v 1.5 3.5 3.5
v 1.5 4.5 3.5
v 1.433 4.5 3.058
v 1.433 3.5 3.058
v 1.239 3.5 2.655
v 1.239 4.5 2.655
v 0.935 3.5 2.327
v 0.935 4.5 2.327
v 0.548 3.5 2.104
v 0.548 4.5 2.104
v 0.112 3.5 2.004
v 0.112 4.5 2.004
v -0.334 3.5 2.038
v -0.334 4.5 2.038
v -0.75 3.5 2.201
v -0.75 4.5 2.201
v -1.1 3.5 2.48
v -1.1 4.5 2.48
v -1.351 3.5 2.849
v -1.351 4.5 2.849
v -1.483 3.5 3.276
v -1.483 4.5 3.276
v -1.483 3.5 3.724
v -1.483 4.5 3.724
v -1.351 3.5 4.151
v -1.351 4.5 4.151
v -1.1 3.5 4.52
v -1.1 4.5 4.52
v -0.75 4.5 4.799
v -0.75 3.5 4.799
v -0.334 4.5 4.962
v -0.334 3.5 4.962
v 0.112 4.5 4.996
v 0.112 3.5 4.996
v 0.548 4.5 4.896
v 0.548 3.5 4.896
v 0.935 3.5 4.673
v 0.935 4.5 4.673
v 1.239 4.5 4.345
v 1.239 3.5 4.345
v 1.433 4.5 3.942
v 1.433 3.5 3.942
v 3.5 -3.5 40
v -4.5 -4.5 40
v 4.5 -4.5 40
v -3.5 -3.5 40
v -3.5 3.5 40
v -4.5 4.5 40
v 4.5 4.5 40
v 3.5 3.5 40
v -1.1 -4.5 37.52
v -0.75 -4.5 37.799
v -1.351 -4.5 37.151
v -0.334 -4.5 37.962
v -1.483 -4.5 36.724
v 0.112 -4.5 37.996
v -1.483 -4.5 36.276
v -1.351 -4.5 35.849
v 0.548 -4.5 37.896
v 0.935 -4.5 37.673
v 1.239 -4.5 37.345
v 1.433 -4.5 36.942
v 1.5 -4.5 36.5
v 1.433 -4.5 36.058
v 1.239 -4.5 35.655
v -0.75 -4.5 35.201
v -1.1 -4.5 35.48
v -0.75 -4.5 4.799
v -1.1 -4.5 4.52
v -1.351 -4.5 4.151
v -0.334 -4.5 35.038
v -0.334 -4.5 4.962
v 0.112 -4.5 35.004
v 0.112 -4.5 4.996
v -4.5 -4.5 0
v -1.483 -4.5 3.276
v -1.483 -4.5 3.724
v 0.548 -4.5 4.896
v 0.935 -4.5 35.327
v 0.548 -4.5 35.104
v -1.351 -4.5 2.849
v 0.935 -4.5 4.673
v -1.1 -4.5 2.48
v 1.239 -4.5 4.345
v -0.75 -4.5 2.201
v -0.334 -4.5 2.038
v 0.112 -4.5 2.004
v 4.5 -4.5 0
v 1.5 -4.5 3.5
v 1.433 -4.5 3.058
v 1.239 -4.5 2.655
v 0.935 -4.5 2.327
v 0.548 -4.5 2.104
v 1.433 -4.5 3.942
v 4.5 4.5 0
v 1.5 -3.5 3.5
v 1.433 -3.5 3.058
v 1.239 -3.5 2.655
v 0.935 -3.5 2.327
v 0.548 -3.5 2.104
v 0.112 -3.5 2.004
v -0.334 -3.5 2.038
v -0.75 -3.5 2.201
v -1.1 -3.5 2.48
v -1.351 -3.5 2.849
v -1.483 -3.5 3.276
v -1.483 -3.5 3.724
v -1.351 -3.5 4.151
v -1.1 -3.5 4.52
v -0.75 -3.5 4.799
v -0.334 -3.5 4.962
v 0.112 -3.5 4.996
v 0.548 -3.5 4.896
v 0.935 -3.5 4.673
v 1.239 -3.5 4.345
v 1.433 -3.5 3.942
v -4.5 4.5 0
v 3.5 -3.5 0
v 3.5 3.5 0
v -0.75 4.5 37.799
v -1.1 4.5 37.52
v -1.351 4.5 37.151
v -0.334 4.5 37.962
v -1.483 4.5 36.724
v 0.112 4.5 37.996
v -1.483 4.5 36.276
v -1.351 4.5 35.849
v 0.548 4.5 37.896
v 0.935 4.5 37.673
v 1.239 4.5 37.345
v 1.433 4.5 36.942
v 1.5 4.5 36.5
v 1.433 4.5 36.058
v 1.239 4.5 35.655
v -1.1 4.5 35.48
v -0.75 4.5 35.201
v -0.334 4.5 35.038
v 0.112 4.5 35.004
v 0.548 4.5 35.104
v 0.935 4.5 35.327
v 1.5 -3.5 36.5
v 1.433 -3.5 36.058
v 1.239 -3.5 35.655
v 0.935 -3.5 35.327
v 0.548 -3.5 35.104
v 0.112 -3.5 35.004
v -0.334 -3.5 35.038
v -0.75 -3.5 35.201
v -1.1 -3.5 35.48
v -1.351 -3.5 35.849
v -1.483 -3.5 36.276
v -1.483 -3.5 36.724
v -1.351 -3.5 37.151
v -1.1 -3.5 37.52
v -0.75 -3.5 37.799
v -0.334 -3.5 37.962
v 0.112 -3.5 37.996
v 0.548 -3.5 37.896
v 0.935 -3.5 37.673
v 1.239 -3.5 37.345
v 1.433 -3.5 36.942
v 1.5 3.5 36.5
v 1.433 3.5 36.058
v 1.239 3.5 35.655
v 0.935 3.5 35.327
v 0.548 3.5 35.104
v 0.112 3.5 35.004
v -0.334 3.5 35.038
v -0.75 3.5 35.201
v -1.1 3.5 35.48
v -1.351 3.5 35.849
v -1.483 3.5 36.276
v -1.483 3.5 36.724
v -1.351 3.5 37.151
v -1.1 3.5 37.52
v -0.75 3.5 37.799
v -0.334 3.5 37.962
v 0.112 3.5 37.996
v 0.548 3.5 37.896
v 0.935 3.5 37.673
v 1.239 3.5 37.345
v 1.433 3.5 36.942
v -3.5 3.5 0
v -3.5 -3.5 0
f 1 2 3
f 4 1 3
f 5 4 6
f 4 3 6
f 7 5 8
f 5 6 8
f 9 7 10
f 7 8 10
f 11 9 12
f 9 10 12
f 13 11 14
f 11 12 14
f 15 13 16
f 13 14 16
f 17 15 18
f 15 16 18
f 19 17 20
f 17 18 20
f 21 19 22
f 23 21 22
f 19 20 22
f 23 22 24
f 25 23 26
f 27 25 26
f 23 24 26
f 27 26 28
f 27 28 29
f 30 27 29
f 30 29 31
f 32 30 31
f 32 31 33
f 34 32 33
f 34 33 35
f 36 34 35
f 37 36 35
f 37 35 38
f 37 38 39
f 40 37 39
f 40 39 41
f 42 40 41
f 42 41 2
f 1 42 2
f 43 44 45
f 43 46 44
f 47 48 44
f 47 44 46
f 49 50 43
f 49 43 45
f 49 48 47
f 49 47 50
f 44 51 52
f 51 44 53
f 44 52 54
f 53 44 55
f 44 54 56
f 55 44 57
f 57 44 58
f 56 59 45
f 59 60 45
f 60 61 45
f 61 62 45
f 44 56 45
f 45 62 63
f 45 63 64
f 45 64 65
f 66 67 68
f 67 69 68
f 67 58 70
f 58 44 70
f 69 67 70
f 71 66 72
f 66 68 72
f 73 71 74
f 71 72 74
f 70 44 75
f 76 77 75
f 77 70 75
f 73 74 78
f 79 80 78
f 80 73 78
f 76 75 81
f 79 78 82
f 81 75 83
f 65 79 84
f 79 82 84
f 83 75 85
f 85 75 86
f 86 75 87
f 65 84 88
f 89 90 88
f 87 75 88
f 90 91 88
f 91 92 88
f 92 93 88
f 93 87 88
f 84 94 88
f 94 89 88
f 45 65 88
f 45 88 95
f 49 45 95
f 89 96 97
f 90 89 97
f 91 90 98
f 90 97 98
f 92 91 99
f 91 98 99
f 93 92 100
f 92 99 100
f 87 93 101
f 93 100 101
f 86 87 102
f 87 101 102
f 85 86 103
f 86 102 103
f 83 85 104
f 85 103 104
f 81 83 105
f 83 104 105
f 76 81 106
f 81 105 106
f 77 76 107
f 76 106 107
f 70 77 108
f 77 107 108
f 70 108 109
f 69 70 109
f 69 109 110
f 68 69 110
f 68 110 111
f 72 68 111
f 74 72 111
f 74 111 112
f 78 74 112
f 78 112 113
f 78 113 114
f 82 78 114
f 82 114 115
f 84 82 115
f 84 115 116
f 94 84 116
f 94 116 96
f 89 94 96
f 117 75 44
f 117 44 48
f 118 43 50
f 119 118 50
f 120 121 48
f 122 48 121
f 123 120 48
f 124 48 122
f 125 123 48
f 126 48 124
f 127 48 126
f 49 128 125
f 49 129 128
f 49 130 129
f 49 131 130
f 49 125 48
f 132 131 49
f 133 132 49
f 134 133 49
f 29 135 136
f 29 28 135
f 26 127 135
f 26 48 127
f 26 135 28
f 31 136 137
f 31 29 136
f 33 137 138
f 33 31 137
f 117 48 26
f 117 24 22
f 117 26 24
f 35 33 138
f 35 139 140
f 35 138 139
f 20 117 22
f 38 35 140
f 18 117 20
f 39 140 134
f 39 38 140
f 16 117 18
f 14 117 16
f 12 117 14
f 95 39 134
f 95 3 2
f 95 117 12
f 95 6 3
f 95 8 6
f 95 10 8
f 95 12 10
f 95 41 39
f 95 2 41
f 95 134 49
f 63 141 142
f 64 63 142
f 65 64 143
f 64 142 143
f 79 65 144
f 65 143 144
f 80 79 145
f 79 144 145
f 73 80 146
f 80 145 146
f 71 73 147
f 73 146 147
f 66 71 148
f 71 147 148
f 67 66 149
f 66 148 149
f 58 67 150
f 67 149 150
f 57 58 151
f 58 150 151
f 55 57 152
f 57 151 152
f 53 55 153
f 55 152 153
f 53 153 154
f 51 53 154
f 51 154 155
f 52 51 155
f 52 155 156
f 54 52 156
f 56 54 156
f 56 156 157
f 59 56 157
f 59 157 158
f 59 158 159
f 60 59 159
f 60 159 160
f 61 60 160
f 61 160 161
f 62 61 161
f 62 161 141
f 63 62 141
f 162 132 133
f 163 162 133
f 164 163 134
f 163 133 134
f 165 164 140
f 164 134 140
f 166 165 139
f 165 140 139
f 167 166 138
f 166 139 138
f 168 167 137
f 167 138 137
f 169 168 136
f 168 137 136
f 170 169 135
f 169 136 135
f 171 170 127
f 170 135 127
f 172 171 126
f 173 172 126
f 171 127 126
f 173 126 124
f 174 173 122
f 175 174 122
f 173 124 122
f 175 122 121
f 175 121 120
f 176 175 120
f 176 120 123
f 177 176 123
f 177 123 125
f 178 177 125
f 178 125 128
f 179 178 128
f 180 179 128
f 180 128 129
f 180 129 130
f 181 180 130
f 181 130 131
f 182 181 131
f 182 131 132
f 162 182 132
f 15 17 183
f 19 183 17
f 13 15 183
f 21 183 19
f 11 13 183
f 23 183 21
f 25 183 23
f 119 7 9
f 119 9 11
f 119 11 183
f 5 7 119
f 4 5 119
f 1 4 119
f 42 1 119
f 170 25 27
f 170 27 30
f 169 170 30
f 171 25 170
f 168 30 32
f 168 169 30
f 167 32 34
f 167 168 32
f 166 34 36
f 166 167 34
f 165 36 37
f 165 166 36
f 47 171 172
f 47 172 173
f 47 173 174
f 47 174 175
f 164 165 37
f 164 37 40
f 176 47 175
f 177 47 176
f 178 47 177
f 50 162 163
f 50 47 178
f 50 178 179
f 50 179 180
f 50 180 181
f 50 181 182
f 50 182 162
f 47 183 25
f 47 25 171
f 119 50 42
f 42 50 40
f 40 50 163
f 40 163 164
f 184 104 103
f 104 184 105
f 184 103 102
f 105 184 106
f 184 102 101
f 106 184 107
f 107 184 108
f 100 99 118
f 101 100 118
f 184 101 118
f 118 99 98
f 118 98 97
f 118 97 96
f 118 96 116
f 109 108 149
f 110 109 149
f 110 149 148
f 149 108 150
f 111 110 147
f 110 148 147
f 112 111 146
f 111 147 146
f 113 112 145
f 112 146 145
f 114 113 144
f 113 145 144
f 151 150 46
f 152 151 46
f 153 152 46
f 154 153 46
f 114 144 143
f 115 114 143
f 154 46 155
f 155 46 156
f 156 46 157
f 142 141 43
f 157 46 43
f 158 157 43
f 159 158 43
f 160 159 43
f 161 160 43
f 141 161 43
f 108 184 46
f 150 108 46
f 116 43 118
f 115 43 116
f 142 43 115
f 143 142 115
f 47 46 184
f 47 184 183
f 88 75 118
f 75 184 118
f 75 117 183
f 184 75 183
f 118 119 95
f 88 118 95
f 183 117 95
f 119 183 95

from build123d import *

# Parameters (mm, degrees)
SKETCH_1_W          = 9
SKETCH_1_H          = 9
EXTRUDE_1_DEPTH     = 40
SKETCH_2_W          = 7
SKETCH_2_H          = 7
CUT_EXTRUDE_1_DEPTH = 40
SKETCH_3_R          = 1.5
CUT_EXTRUDE_2_DEPTH = 38


with BuildPart() as part:
    # ｽｹｯﾁ1 → ﾎﾞｽ - 押し出し1 (new body)
    with BuildSketch(Plane.XY):
        Rectangle(SKETCH_1_W, SKETCH_1_H)
    extrude(amount=EXTRUDE_1_DEPTH)

    # ｽｹｯﾁ2 → ｶｯﾄ - 押し出し1 (cut)
    with BuildSketch(Plane.XY.offset(40)):
        Rectangle(SKETCH_2_W, SKETCH_2_H)
    extrude(amount=-CUT_EXTRUDE_1_DEPTH, mode=Mode.SUBTRACT)

    # ｽｹｯﾁ3 → ｶｯﾄ - 押し出し2 (cut)
    with BuildSketch(Plane(origin=(0, 4.5, 0), x_dir=(1, 0, 0), z_dir=(0, 1, 0))):
        with Locations((0, -3.5)):
            Circle(SKETCH_3_R)
        with Locations((0, -36.5)):
            Circle(SKETCH_3_R)
    extrude(amount=-CUT_EXTRUDE_2_DEPTH, mode=Mode.SUBTRACT)


solid = part.part
